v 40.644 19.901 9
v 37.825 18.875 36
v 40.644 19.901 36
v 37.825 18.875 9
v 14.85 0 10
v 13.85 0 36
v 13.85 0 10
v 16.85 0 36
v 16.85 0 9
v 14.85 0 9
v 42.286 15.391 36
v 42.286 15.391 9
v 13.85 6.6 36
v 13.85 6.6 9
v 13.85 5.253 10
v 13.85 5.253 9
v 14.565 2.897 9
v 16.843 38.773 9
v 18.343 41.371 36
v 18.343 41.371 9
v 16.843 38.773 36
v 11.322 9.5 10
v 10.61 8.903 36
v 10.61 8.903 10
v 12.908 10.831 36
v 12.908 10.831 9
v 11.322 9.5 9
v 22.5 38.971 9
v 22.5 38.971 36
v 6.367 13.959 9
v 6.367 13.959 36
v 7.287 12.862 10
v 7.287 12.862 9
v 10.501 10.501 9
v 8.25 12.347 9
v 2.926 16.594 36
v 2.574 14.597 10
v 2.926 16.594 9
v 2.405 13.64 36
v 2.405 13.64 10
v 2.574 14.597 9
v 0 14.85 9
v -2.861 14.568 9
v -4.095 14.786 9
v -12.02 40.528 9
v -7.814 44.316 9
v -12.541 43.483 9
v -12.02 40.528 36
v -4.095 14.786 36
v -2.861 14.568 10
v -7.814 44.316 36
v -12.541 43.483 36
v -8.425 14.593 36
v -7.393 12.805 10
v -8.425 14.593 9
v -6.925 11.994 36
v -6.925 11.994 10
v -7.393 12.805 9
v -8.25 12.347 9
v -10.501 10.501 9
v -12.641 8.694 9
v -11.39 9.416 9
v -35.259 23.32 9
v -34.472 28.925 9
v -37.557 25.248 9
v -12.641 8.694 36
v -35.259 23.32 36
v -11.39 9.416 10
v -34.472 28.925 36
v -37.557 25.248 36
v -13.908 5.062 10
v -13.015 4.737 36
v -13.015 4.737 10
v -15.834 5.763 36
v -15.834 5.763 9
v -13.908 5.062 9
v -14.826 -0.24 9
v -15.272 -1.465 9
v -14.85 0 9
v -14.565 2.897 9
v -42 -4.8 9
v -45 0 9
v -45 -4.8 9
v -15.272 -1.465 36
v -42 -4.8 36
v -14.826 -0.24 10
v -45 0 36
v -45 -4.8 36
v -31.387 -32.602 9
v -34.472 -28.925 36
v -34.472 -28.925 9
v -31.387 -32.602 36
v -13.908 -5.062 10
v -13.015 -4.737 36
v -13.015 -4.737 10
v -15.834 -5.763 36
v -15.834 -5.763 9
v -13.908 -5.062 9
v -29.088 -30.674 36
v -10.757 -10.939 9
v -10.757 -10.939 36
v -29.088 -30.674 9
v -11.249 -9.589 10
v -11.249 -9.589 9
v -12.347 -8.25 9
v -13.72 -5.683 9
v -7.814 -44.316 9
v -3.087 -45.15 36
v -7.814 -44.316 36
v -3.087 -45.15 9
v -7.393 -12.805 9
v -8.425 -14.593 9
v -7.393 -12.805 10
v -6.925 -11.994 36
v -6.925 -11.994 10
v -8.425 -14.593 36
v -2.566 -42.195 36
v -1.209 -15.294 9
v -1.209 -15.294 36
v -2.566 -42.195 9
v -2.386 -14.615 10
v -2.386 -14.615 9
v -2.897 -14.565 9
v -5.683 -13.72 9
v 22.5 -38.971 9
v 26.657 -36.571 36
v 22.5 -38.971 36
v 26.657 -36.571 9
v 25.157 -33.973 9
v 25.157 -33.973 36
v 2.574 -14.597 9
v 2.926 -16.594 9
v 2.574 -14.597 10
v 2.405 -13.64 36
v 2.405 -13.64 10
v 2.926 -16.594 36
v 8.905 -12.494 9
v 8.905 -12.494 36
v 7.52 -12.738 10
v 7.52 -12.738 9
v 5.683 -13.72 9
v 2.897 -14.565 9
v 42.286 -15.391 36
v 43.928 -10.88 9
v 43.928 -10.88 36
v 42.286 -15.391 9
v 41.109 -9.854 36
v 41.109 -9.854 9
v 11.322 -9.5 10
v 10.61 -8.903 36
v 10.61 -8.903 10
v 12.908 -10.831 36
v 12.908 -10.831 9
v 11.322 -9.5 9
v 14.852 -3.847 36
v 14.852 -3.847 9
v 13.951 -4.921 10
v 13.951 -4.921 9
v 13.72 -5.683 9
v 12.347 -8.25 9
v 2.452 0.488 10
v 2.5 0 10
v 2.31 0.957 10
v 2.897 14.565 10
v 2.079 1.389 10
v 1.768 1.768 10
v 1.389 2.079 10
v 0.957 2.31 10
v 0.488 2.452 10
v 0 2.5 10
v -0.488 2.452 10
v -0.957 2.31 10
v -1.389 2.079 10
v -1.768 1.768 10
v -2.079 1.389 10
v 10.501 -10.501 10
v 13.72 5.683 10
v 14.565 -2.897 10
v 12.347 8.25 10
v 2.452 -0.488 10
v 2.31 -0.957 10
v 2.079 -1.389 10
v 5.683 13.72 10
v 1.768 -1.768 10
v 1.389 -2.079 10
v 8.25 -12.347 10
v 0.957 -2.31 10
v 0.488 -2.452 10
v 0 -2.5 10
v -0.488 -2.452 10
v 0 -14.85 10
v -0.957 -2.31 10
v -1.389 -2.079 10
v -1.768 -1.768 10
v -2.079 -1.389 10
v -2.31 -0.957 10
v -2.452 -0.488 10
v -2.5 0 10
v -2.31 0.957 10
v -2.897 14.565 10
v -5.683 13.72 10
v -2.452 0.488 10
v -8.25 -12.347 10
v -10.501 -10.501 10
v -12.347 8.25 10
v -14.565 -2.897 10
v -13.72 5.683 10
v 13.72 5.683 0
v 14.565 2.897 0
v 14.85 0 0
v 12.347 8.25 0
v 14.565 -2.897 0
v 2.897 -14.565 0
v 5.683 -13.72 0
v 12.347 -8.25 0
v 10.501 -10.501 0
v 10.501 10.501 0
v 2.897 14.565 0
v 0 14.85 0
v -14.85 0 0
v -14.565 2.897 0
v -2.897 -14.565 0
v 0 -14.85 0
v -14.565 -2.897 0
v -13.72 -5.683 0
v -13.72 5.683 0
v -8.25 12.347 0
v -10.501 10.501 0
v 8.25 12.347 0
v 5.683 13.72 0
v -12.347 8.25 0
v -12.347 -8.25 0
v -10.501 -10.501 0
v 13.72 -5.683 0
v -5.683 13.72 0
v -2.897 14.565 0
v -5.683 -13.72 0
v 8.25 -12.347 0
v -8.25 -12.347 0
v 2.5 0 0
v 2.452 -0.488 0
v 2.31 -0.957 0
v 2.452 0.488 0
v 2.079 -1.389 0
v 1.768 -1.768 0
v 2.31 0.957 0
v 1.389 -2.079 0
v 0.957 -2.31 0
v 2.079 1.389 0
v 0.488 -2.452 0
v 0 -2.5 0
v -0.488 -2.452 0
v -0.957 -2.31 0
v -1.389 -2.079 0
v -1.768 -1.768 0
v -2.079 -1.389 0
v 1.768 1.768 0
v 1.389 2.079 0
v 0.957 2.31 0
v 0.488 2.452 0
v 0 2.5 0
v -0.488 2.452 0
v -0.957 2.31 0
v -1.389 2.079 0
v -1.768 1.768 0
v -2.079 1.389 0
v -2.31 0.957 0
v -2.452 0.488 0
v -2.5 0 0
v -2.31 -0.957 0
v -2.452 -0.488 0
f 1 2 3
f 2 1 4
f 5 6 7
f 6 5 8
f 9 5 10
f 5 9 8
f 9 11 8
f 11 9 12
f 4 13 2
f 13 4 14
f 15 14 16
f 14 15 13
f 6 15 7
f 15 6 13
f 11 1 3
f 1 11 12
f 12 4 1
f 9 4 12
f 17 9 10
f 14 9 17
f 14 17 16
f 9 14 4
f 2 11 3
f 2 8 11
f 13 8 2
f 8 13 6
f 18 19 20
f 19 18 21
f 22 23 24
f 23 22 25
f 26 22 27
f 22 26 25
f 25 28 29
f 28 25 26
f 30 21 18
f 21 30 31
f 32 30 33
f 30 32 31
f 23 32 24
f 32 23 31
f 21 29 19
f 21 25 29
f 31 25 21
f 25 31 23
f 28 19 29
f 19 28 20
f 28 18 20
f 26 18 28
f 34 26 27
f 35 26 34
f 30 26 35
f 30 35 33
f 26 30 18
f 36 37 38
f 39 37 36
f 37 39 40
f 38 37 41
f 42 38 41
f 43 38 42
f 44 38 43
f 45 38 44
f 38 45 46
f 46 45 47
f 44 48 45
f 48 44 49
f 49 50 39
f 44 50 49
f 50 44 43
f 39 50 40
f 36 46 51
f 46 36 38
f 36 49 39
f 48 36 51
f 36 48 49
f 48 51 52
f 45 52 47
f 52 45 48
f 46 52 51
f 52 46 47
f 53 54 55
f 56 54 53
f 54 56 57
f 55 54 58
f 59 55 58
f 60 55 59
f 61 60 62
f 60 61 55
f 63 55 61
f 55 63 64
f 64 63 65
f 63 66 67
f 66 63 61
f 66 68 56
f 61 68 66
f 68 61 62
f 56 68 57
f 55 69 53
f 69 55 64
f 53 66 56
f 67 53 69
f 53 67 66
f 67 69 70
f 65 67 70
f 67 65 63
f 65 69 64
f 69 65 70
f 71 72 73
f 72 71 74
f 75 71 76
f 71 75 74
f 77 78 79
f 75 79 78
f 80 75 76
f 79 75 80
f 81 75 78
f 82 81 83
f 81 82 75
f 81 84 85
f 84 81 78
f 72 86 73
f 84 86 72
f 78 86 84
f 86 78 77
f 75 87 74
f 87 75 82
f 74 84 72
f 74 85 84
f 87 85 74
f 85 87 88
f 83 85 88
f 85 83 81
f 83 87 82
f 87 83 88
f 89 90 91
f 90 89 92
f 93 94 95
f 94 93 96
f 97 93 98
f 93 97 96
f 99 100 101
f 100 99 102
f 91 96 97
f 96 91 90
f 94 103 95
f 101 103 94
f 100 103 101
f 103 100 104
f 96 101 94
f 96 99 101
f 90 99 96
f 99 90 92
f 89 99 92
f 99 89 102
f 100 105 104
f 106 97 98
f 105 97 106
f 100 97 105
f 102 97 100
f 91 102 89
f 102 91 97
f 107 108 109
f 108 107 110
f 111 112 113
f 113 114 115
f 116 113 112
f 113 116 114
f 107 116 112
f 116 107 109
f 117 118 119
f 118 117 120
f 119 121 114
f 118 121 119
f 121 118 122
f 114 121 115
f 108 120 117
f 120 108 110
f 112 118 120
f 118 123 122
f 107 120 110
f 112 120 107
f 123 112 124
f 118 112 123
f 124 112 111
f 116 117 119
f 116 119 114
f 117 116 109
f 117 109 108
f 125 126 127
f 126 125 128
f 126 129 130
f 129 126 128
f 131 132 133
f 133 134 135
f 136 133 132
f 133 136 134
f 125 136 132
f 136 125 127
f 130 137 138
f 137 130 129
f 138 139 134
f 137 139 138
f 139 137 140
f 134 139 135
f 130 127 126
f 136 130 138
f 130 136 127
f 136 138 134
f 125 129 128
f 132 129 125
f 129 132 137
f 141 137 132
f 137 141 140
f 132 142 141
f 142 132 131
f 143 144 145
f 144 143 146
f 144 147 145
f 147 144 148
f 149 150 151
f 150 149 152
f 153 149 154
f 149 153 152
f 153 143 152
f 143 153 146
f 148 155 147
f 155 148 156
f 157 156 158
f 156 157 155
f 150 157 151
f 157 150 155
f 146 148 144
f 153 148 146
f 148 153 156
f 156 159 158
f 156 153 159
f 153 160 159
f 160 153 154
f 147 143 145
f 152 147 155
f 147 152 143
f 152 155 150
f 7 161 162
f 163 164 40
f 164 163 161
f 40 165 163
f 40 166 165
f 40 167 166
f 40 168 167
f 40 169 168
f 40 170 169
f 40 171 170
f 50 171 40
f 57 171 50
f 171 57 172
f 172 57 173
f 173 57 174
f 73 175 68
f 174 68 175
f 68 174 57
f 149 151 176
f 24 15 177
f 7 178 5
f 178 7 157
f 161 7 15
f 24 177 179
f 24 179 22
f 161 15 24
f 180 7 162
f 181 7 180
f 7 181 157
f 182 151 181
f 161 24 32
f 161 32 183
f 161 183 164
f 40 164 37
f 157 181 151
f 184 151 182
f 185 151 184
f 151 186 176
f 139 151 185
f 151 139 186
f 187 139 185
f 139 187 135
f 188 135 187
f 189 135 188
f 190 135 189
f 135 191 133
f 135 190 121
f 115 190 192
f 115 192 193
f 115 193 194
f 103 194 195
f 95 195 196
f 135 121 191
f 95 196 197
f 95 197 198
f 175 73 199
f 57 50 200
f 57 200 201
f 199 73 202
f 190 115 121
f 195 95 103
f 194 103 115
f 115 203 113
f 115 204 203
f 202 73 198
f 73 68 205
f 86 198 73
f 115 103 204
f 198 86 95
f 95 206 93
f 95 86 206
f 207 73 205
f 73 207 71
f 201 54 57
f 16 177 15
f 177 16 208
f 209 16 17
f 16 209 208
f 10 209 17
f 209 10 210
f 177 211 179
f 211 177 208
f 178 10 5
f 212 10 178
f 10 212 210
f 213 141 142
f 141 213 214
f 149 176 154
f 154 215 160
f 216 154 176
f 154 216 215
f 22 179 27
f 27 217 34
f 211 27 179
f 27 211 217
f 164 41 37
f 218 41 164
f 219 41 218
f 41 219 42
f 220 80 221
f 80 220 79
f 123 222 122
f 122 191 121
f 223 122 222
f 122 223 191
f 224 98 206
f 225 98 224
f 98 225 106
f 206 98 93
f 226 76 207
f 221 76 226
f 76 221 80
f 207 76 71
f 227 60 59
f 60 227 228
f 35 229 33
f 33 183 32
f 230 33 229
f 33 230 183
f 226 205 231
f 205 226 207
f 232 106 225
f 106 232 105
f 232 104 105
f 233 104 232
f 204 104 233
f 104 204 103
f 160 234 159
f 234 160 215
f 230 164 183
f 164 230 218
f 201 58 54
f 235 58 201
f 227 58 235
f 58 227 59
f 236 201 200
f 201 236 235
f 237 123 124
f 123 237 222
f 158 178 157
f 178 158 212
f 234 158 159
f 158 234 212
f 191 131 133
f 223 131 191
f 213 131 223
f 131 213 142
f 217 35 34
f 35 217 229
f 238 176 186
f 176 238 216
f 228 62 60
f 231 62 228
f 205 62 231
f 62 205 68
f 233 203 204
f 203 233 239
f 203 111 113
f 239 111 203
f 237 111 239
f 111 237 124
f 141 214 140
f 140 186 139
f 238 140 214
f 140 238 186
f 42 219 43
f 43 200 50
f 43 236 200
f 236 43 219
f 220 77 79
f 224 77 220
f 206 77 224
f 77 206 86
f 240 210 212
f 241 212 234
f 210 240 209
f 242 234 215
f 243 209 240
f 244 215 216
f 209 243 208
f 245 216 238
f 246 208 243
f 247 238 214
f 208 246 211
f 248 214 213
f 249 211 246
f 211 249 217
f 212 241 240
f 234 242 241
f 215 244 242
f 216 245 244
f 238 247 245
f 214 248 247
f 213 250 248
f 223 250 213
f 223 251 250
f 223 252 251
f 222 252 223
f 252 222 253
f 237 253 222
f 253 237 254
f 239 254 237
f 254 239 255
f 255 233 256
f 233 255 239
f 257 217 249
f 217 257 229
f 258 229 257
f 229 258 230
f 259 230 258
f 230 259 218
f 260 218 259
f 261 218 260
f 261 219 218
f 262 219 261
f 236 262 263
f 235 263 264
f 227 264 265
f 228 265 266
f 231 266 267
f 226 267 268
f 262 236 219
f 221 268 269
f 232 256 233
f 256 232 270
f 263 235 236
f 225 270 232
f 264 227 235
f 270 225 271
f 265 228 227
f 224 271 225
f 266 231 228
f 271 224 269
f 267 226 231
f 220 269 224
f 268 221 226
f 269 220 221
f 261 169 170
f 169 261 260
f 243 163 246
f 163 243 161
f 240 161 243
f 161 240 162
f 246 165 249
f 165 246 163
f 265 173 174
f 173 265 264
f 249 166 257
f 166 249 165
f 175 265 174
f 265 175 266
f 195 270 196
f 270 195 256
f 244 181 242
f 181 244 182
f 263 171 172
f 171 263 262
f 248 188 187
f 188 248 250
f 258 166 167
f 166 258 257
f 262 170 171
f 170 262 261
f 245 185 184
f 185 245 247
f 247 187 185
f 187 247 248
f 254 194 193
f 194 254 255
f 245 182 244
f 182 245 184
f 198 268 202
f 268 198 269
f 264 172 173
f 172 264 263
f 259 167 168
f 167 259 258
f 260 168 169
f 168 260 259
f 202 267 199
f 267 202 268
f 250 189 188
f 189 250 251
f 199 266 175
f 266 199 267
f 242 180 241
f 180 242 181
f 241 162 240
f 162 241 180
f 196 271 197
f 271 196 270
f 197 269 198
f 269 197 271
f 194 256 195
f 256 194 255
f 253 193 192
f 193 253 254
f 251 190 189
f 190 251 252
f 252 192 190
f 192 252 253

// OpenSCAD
$fn = 32;

// ----------------------------------------------------------------------
// Impeller: 90 mm, 9 blades, 36 mm tall
// ----------------------------------------------------------------------

// --- parameters (mm) ---
center_d = 29.7;          // hub diameter
center_h = 10;            // hub height
wheel_d = 90;             // outer diameter over the blades
blade_count = 9;          // number of blades
blade_t = 3;              // blade thickness
blade_h = 26;             // blade height
blade_in_r = 13.85;       // blade root radius
blade_out_r = 42;         // blade tip radius
sweep = 20;               // blade sweep, degrees
bore_d = 5;               // shaft bore

module hub() {
  cylinder(h = center_h, d = center_d);
}

module blade() {
  /* blade swept between two boxes: hull of the root and the tip section */
  hull() {
    translate([blade_in_r, 0, center_h - 1])
      cube([blade_t, blade_t * 2.2, blade_h + 1], center = false);
    rotate([0, 0, sweep])
      translate([blade_out_r, 0, center_h - 1])
        cube([blade_t, blade_t * 1.6, blade_h + 1], center = false);
  }
}

module blades() {
  for (i = [0 : blade_count - 1])
    rotate([0, 0, i * 360 / blade_count]) blade();
}

difference() {
  union() {
    hub();
    blades();
  }
  translate([0, 0, -1]) cylinder(h = center_h + blade_h + 0 + 3, d = bore_d);
}
